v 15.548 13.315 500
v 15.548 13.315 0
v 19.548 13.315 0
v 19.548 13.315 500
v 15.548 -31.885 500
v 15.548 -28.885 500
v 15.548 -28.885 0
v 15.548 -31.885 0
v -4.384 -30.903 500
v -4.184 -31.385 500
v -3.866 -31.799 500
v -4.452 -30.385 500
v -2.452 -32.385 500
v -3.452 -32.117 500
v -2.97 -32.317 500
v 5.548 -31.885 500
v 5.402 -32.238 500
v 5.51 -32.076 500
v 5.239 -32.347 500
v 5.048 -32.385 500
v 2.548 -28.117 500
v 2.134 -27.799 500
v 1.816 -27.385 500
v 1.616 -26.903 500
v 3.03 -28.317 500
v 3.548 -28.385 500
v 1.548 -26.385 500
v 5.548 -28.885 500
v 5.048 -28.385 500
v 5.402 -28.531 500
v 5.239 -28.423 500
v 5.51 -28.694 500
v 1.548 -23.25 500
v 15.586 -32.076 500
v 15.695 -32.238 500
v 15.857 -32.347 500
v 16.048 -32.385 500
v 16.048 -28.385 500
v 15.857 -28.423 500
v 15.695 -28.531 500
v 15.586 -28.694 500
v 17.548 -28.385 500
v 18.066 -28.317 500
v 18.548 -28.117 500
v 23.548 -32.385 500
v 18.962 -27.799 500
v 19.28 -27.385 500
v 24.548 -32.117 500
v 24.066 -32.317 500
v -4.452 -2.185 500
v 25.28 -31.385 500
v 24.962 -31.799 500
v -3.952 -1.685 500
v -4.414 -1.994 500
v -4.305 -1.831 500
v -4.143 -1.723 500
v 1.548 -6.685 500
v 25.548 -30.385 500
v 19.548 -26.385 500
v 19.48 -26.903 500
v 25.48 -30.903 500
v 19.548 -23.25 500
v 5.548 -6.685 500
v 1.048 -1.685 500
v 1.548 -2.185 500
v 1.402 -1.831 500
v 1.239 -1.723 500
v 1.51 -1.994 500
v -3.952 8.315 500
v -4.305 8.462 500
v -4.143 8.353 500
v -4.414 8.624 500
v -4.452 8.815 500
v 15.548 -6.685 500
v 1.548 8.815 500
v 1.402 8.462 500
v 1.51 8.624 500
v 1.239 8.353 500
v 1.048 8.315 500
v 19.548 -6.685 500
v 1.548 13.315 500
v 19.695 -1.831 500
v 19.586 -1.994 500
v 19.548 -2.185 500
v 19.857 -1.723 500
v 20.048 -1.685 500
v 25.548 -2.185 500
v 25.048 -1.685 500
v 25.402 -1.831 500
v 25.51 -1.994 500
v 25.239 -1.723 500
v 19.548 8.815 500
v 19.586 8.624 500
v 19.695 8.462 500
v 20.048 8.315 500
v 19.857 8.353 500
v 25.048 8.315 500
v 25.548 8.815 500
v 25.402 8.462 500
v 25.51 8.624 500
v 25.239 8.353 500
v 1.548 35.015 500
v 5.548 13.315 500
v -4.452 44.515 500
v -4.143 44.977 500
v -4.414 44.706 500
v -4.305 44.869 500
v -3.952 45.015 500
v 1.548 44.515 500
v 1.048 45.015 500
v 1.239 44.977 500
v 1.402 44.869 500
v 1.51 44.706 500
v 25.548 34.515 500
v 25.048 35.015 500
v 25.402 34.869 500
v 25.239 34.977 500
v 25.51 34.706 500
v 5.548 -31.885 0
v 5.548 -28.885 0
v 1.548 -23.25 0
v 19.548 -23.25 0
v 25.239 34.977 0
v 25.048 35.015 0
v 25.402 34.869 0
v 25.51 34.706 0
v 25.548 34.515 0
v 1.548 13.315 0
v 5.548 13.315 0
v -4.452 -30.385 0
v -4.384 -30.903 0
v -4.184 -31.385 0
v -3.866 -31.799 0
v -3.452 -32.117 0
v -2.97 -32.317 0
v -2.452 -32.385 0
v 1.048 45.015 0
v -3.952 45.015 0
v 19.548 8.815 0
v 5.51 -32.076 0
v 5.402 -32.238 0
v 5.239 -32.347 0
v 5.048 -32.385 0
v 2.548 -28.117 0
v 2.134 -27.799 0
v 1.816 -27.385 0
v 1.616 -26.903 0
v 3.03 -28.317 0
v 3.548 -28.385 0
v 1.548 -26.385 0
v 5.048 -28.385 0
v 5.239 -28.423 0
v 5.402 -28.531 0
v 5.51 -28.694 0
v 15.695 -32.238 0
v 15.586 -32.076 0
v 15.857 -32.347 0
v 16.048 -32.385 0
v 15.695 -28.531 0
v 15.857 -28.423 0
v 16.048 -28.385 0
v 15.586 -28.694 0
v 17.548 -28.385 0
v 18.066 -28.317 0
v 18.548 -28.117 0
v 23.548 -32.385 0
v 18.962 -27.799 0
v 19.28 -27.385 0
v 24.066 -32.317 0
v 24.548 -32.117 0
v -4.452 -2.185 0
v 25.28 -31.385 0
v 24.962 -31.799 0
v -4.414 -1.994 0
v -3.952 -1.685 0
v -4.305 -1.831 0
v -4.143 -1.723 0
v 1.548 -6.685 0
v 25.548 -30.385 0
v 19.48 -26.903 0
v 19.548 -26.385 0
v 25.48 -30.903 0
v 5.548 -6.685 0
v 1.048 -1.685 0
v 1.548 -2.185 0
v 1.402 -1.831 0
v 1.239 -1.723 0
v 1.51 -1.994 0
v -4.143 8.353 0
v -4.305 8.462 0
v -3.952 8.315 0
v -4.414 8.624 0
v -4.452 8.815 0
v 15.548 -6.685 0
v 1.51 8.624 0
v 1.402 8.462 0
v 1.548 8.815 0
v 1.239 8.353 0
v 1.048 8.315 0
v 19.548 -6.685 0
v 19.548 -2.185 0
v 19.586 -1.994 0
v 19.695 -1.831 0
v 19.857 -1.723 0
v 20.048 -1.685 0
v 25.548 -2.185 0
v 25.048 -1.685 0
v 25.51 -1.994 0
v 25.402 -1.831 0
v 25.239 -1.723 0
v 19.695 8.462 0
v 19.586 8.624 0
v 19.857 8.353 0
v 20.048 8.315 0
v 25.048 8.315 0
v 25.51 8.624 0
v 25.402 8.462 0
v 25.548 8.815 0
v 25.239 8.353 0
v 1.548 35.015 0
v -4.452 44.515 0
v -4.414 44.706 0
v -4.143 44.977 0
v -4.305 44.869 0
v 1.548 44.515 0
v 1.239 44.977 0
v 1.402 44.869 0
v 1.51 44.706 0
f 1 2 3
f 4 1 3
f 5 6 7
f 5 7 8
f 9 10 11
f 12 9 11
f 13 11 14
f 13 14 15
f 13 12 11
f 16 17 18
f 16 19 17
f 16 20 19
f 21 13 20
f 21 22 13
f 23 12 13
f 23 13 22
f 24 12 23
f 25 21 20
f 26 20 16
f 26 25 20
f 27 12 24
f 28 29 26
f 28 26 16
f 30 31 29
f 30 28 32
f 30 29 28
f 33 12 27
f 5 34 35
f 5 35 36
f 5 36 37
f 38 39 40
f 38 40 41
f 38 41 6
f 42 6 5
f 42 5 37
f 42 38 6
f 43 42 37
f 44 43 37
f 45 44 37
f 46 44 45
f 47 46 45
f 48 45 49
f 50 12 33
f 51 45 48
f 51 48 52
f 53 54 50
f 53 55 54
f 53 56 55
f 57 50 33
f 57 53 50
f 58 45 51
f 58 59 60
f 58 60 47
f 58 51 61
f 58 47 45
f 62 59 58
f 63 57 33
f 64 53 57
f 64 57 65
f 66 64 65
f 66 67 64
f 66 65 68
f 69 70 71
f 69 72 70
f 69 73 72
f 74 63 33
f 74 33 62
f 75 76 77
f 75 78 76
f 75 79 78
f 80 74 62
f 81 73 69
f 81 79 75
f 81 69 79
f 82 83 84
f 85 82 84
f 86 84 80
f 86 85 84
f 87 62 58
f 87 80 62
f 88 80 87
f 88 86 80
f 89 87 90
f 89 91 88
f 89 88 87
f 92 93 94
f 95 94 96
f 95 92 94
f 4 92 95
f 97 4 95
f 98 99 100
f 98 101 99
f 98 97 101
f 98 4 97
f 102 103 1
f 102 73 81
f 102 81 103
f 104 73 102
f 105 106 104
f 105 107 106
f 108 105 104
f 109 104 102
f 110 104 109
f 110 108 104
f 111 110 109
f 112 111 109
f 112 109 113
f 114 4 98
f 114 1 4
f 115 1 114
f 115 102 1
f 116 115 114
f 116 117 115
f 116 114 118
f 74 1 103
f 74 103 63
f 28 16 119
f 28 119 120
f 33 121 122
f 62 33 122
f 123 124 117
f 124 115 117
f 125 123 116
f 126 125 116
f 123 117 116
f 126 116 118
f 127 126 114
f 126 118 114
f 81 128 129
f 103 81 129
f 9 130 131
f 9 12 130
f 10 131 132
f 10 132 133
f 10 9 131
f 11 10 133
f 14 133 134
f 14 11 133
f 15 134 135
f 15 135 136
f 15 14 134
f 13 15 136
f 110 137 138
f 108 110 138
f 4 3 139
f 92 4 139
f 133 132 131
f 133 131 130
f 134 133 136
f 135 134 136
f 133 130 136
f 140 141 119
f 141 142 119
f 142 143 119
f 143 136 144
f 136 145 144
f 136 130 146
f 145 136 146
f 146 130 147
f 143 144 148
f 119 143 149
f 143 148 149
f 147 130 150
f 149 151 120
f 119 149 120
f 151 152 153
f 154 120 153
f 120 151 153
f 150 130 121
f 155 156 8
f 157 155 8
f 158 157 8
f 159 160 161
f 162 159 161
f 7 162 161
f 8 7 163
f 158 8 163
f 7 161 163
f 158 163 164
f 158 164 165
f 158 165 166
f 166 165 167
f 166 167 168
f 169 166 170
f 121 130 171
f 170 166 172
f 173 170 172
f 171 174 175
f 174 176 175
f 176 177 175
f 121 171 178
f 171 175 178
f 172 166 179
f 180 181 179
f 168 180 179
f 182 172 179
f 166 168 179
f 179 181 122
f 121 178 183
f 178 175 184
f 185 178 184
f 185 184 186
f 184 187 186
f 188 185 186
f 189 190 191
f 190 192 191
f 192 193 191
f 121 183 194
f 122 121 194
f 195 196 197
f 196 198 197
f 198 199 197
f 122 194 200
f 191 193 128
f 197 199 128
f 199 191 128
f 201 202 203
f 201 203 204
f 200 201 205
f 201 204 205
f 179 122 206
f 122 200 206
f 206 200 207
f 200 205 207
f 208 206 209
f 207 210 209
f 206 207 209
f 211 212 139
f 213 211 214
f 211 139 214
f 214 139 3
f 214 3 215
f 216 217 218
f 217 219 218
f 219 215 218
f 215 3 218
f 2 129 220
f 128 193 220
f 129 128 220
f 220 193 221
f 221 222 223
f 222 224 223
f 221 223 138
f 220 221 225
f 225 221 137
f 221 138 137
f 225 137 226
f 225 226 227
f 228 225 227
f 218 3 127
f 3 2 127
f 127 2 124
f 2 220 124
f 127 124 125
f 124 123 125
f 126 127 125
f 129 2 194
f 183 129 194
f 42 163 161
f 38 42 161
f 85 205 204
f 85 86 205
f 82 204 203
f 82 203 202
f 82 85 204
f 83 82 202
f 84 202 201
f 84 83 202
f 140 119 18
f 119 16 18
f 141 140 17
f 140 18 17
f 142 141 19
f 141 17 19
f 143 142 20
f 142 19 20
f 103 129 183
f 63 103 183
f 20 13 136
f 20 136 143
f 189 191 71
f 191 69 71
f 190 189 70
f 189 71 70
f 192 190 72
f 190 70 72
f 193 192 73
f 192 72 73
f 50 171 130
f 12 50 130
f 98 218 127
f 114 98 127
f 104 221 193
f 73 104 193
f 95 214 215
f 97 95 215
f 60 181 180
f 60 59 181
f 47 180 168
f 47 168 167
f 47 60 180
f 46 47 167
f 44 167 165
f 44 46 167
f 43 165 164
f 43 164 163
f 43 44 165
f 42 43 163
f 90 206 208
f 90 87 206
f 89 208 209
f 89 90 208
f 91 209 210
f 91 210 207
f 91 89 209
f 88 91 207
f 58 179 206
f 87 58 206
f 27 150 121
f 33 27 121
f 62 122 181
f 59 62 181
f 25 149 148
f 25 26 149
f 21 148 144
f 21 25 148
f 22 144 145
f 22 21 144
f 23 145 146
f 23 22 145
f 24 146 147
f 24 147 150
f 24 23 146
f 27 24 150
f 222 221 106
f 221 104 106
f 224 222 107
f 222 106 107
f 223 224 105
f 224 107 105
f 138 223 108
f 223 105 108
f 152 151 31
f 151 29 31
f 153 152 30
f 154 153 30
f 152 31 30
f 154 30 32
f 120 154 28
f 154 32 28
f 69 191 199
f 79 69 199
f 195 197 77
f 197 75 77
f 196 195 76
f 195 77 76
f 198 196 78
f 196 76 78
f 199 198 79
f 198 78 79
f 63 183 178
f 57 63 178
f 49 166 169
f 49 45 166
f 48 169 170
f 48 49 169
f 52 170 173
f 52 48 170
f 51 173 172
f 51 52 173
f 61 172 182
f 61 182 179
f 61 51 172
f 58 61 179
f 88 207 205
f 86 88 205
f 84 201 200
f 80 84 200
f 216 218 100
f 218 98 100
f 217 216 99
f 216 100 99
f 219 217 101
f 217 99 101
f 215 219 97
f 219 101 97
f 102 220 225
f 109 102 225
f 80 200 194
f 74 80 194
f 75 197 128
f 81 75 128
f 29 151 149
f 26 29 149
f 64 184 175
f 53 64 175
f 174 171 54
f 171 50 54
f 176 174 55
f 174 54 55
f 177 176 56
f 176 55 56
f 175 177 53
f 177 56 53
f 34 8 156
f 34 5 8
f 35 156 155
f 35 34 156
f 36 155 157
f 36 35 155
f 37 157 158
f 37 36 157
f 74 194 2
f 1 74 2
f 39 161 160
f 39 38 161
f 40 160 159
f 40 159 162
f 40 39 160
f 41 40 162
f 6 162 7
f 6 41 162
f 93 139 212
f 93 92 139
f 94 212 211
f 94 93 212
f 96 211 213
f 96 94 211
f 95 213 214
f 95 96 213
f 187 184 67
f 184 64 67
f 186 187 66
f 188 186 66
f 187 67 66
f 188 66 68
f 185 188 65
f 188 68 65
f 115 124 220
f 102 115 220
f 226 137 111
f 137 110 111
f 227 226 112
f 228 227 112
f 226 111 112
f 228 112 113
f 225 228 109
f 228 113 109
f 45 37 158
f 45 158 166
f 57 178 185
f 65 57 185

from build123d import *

# Parameters (mm, degrees)
SALIENTE_EXTRUIR1_DEPTH = 500
REDONDEO1_R             = 2
REDONDEO2_R             = 2
REDONDEO4_R             = 0.5


with BuildPart() as part:
    # Croquis1 → Saliente-Extruir1 (new body)
    with BuildSketch(Plane.XY):
        Polygon((-4.451940983, 8.315120378), (1.548059017, 8.315120378), (1.548059017, 13.315120378), (5.548059017, 13.315120378), (5.548059017, -6.684879622), (1.548059017, -6.684879622), (1.548059017, -1.684879622), (-4.451940983, -1.684879622), (-4.451940983, -32.384879622), (5.548059017, -32.384879622), (5.548059017, -28.384879622), (1.548059017, -28.384879622), (1.548059017, -23.250181803), (19.548059017, -23.250181803), (19.548059017, -28.384879622), (15.548059017, -28.384879622), (15.548059017, -32.384879622), (25.548059017, -32.384879622), (25.548059017, -1.684879622), (19.548059017, -1.684879622), (19.548059017, -6.684879622), (15.548059017, -6.684879622), (15.548059017, 13.315120378), (19.548059017, 13.315120378), (19.548059017, 8.315120378), (25.548059017, 8.315120378), (25.548059017, 35.015120378), (1.548059017, 35.015120378), (1.548059017, 45.015120378), (-4.451940983, 45.015120378), align=None)
    extrude(amount=SALIENTE_EXTRUIR1_DEPTH)

    # Redondeo1
    redondeo1_edges = [part.edges().sort_by_distance(p)[0] for p in [
        (25.548059017, -32.384879622, 250),
        (-4.451940983, -32.384879622, 250),
    ]]
    fillet(redondeo1_edges, radius=REDONDEO1_R)

    # Redondeo2
    redondeo2_edges = [part.edges().sort_by_distance(p)[0] for p in [
        (19.548059017, -28.384879622, 250),
        (1.548059017, -28.384879622, 250),
    ]]
    fillet(redondeo2_edges, radius=REDONDEO2_R)

    # Redondeo4
    redondeo4_edges = [part.edges().sort_by_distance(p)[0] for p in [
        (19.548059017, -1.684879622, 250),
        (25.548059017, -1.684879622, 250),
        (15.548059017, -32.384879622, 250),
        (15.548059017, -28.384879622, 250),
        (5.548059017, -28.384879622, 250),
        (5.548059017, -32.384879622, 250),
        (-4.451940983, -1.684879622, 250),
        (1.548059017, -1.684879622, 250),
        (1.548059017, 8.315120378, 250),
        (-4.451940983, 8.315120378, 250),
        (-4.451940983, 45.015120378, 250),
        (1.548059017, 45.015120378, 250),
        (25.548059017, 35.015120378, 250),
        (25.548059017, 8.315120378, 250),
        (19.548059017, 8.315120378, 250),
    ]]
    fillet(redondeo4_edges, radius=REDONDEO4_R)


solid = part.part
